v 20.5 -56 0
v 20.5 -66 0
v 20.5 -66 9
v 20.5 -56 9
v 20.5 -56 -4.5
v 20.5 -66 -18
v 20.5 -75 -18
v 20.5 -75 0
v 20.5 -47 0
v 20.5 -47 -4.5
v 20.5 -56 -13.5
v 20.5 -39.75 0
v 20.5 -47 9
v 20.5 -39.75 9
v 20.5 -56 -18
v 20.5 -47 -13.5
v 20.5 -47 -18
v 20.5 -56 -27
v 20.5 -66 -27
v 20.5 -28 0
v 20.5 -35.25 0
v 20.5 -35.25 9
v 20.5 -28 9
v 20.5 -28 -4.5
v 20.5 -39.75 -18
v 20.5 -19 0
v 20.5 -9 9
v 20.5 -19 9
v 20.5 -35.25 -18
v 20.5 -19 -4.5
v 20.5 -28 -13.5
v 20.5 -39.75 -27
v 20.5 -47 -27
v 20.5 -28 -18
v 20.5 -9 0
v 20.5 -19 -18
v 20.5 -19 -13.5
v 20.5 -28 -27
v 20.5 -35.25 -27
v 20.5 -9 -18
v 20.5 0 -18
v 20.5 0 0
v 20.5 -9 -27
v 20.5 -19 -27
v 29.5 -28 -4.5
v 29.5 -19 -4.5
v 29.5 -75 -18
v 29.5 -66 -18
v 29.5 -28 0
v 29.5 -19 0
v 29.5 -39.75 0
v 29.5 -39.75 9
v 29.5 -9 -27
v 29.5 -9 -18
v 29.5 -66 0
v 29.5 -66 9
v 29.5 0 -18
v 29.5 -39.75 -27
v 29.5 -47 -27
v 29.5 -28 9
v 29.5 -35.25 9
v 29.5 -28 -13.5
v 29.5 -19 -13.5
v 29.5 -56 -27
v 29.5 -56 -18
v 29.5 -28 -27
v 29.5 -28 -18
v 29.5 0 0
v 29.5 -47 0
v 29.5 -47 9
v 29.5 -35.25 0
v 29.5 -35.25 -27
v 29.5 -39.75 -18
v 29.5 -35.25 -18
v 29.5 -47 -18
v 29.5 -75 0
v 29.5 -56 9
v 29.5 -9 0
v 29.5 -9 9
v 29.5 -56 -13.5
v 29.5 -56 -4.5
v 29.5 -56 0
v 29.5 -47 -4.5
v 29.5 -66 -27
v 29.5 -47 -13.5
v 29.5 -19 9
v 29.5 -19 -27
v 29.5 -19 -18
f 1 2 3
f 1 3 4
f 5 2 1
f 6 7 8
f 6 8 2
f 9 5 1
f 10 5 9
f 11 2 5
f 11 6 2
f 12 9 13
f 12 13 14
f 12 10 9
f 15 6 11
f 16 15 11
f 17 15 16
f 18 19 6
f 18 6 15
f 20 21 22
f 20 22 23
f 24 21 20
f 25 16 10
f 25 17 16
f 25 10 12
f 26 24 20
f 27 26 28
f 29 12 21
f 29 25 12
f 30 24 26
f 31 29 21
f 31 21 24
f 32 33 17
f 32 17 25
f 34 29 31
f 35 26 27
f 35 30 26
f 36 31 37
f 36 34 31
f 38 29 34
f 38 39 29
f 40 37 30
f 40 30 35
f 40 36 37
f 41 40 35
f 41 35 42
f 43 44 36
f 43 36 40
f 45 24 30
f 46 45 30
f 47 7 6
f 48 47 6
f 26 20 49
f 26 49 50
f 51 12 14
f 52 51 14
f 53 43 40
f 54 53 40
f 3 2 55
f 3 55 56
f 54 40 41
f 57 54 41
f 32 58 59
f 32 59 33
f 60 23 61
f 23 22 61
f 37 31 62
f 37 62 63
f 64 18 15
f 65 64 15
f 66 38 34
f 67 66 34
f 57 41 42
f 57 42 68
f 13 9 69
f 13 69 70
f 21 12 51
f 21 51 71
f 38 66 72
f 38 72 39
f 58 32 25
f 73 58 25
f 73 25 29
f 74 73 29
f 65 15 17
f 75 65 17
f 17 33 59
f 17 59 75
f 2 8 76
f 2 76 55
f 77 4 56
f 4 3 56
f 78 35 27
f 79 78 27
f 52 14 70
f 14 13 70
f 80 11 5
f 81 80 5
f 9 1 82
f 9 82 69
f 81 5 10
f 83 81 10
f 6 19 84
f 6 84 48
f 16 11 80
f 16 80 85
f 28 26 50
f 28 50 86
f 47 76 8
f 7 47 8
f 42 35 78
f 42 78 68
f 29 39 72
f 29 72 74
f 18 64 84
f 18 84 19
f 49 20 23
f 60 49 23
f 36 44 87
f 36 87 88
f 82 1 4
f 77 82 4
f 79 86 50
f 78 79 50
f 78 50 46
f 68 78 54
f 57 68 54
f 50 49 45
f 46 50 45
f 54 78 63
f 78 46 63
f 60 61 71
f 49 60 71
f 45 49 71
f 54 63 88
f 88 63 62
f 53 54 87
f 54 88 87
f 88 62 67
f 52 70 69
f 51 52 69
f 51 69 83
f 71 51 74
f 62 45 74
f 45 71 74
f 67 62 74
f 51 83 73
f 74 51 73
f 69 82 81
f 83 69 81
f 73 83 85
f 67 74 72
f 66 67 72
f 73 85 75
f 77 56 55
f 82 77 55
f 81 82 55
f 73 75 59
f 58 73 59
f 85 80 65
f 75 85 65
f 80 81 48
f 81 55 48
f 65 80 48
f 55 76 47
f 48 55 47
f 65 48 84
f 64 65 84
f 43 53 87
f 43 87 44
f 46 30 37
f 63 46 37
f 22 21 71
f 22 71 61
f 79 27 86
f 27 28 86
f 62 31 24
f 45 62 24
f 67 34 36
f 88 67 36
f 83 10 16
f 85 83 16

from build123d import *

# Parameters (mm, degrees)
SKETCH1_R                = 8
SKETCH1_R_2              = 4
BOSS_EXTRUDE1_DEPTH      = 9
BOSS_EXTRUDE1_2_DEPTH    = 9
SKETCH2_R                = 4
BOSS_EXTRUDE3_DEPTH      = 9
FILLET1_R                = 1
CUT_EXTRUDE1_DEPTH       = 214.789616212
SKETCH4_W                = 9
SKETCH4_H                = 27
BOSS_EXTRUDE4_DEPTH      = 75
BOSS_EXTRUDE5_START      = 9
SKETCH5_R                = 25
SKETCH5_R_2              = 4
BOSS_EXTRUDE5_DEPTH      = 9
BOSS_EXTRUDE6_DEPTH      = 4.5
BOSS_EXTRUDE6_DEPTH_BACK = 4.5
BOSS_EXTRUDE7_DEPTH      = 4.5
BOSS_EXTRUDE7_DEPTH_BACK = 4.5
BOSS_EXTRUDE7_START      = -25
SKETCH9_W                = 9
SKETCH9_H                = 7
SKETCH9_H_2              = 9
CUT_EXTRUDE2_DEPTH       = 217.612557346
CUT_EXTRUDE3_DEPTH       = 216.299790989
CUT_EXTRUDE3_DEPTH_BACK  = 216.299790989
SKETCH10_W               = 383.266903908
SKETCH10_H               = 66.559710411
SKETCH10_W_2             = 9
SKETCH10_H_2             = 36
SKETCH12_W               = 9
SKETCH12_H               = 9
SKETCH12_W_2             = 4.5
SKETCH12_H_2             = 9.054007778
SKETCH12_H_3             = 4.5
SKETCH12_H_4             = 5
CUT_EXTRUDE4_DEPTH       = 81.218451743


with BuildPart() as part:
    # Sketch1 → Boss-Extrude1 (new body)
    with BuildSketch(Plane.XY):
        with Locations((-125, 0)):
            Circle(SKETCH1_R)
        with Locations((-125, 0)):
            Circle(SKETCH1_R_2, mode=Mode.SUBTRACT)
    extrude(amount=BOSS_EXTRUDE1_DEPTH)



with BuildPart() as body_2:
    # Sketch1 → Boss-Extrude1 2 (new body)
    with BuildSketch(Plane.XY):
        with Locations((125, 0)):
            Circle(SKETCH1_R)
        with Locations((125, 0)):
            Circle(SKETCH1_R_2, mode=Mode.SUBTRACT)
    extrude(amount=BOSS_EXTRUDE1_2_DEPTH)


with BuildPart() as part_1:
    add(part.part)

    add(body_2.part)  # Boss-Extrude3 merges body 2
    # Sketch2 → Boss-Extrude3 (add)
    with BuildSketch(Plane.XY):
        with BuildLine():
            Line((-175, -75), (125, -75))
            ThreePointArc((125, -75), (130.131670325, -43.377223009), (145.000000492, -14.999999344))
            ThreePointArc((145.000000492, -14.999999344), (143.981414944, 16.269784471), (113.235294528, 22.058823748))
            ThreePointArc((113.235294528, 22.058823748), (25.000000075, 0), (-63.235294395, 22.058823677))
            ThreePointArc((-63.235294395, 22.058823677), (-75.420498385, 24.996463372), (-87.499999896, 21.650635154))
            ThreePointArc((-87.499999896, 21.650635154), (-99.999999954, 18.301270189), (-112.500000024, 21.650635108))
            ThreePointArc((-112.500000024, 21.650635108), (-124.99999995, 25), (-137.49999989, 21.650635158))
            ThreePointArc((-137.49999989, 21.650635158), (-149.999999954, 18.301270189), (-162.50000003, 21.650635112))
            ThreePointArc((-162.50000003, 21.650635112), (-193.705072901, 16.586749162), (-195.000000551, -14.999999265))
            ThreePointArc((-195.000000551, -14.999999265), (-180.13167034, -43.377222962), (-175, -75))
        make_face()
        with Locations((125, 0)):
            Circle(SKETCH2_R, mode=Mode.SUBTRACT)
        with Locations((-175, 0)):
            Circle(SKETCH2_R, mode=Mode.SUBTRACT)
        with Locations((-125, 0)):
            Circle(SKETCH2_R, mode=Mode.SUBTRACT)
        with Locations((-75, 0)):
            Circle(SKETCH2_R, mode=Mode.SUBTRACT)
    extrude(amount=BOSS_EXTRUDE3_DEPTH)

    # Fillet1
    fillet1_edges = [part_1.edges().sort_by_distance(p)[0] for p in [
        (-175, -75, 4.5),
        (125, -75, 4.5),
    ]]
    fillet(fillet1_edges, radius=FILLET1_R)

    # Sketch3 → Cut-Extrude1 (cut, through all)
    with BuildSketch(Plane.XY):
        Polygon((25, 0), (25, -75), (150, -75), (150, 25), (25, 25), align=None)
    extrude(amount=CUT_EXTRUDE1_DEPTH, mode=Mode.SUBTRACT)

    # Sketch4 → Boss-Extrude4 (add)
    with BuildSketch(Plane.XZ.offset(75)):
        with Locations((25, -4.5)):
            Rectangle(SKETCH4_W, SKETCH4_H)
    extrude(amount=-BOSS_EXTRUDE4_DEPTH)

    # Sketch5 → Boss-Extrude5 (add)
    # profile 1 of 4: a face of its own
    with BuildSketch(Plane(origin=(0, 0, -18), x_dir=(-1, 0, 0), z_dir=(0, 0, -1)).offset(BOSS_EXTRUDE5_START)):
        with BuildLine():
            ThreePointArc((-145.000000304, -14.999999594), (-130.131670275, -43.377223158), (-125, -75))
            Line((-125, -75), (-29.5, -75))
            Line((-29.5, -75), (-29.5, 0))
            Line((-29.5, 0), (-100, 0))
            ThreePointArc((-100, 0), (-117.09430609, -23.717082532), (-145.000000304, -14.999999594))
        make_face()
    # profile 2 of 4: a face of its own
    with BuildSketch(Plane(origin=(0, 0, -18), x_dir=(-1, 0, 0), z_dir=(0, 0, -1)).offset(BOSS_EXTRUDE5_START)):
        with Locations((-125, 0)):
            Circle(SKETCH5_R)
        with Locations((-125, 0)):
            Circle(SKETCH5_R_2, mode=Mode.SUBTRACT)
    # profile 3 of 4: a face of its own
    with BuildSketch(Plane(origin=(0, 0, -18), x_dir=(-1, 0, 0), z_dir=(0, 0, -1)).offset(BOSS_EXTRUDE5_START)):
        Polygon((-29.5, 0), (-29.5, -75), (-20.5, -75), (-20.5, 0), (-25, 0), align=None)
    # profile 4 of 4: a face of its own
    with BuildSketch(Plane(origin=(0, 0, -18), x_dir=(-1, 0, 0), z_dir=(0, 0, -1)).offset(BOSS_EXTRUDE5_START)):
        with BuildLine():
            Line((-100, 0), (-29.5, 0))
            Line((-29.5, 0), (-25, 0))
            ThreePointArc((-25, 0), (-70.475429529, 5.598281181), (-113.235293817, 22.058823369))
            ThreePointArc((-113.235293817, 22.058823369), (-103.56267677, 12.86239374), (-100, 0))
        make_face()
    extrude(amount=-BOSS_EXTRUDE5_DEPTH)

    # Sketch7 → Boss-Extrude6 (add, two sides: drawn at the far end of the back side and taken through both)
    with BuildSketch(Plane(origin=(0, -25, 0), x_dir=(1, 0, 0), z_dir=(0, 1, 0)).offset(-BOSS_EXTRUDE6_DEPTH_BACK)):
        with BuildLine():
            Line((56.5, 18), (29.5, 18))
            Line((29.5, 18), (29.5, -9))
            ThreePointArc((29.5, -9), (48.591883092, -1.091883092), (56.5, 18))
        make_face()
        with BuildLine():
            Line((-6.5, 0), (20.5, 0))
            Line((20.5, 0), (20.5, 27))
            ThreePointArc((20.5, 27), (1.408116908, 19.091883092), (-6.5, 0))
        make_face()
    extrude(amount=BOSS_EXTRUDE6_DEPTH + BOSS_EXTRUDE6_DEPTH_BACK)

    # Sketch7<3> → Boss-Extrude7 (add, two sides: drawn at the far end of the back side and taken through both)
    with BuildSketch(Plane(origin=(0, -25, 0), x_dir=(1, 0, 0), z_dir=(0, 1, 0)).offset(BOSS_EXTRUDE7_START - BOSS_EXTRUDE7_DEPTH_BACK)):
        with BuildLine():
            Line((56.5, 18), (29.5, 18))
            Line((29.5, 18), (29.5, -9))
            ThreePointArc((29.5, -9), (48.591883092, -1.091883092), (56.5, 18))
        make_face()
        with BuildLine():
            Line((-6.5, 0), (20.5, 0))
            Line((20.5, 0), (20.5, 27))
            ThreePointArc((20.5, 27), (1.408116908, 19.091883092), (-6.5, 0))
        make_face()
    extrude(amount=BOSS_EXTRUDE7_DEPTH + BOSS_EXTRUDE7_DEPTH_BACK)

    # Sketch9 → Cut-Extrude2 (cut, through all)
    with BuildSketch(Plane.XY.offset(9)):
        with Locations((-160.208548161, -53.5)):
            Rectangle(SKETCH9_W, SKETCH9_H)
        with Locations((-160.208548161, -70.5)):
            Rectangle(SKETCH9_W, SKETCH9_H_2)
        with Locations((-25.351798772, -53.5)):
            Rectangle(SKETCH9_W, SKETCH9_H)
        with Locations((-25.351798772, -70.5)):
            Rectangle(SKETCH9_W, SKETCH9_H_2)
        with Locations((109.504950616, -53.5)):
            Rectangle(SKETCH9_W, SKETCH9_H)
        with Locations((109.504950616, -70.5)):
            Rectangle(SKETCH9_W, SKETCH9_H_2)
    extrude(amount=-CUT_EXTRUDE2_DEPTH, mode=Mode.SUBTRACT)

    # Sketch10 → Cut-Extrude3 (cut, two sides: drawn at the far end of the back side and taken through both)
    with BuildSketch(Plane(origin=(0, 0, 0), x_dir=(1, 0, 0), z_dir=(0, 1, 0)).offset(-CUT_EXTRUDE3_DEPTH_BACK)):
        with Locations((-25.802694846, 3.514309581)):
            Rectangle(SKETCH10_W, SKETCH10_H)
        with Locations((25, 9)):
            Rectangle(SKETCH10_W_2, SKETCH10_H_2, mode=Mode.SUBTRACT)
    extrude(amount=CUT_EXTRUDE3_DEPTH + CUT_EXTRUDE3_DEPTH_BACK, mode=Mode.SUBTRACT)

    # Sketch12 → Cut-Extrude4 (cut, through all)
    with BuildSketch(Plane.ZY.offset(-20.5)):
        with Locations((-22.5, -23.5)):
            Rectangle(SKETCH12_W, SKETCH12_H)
        with Locations((-22.5, -51.5)):
            Rectangle(SKETCH12_W, SKETCH12_H)
        with Locations((4.5, -51.5)):
            Rectangle(SKETCH12_W, SKETCH12_H)
        with Locations((4.5, -23.5)):
            Rectangle(SKETCH12_W, SKETCH12_H)
        with Locations((-6.75, -23.5)):
            Rectangle(SKETCH12_W_2, SKETCH12_H)
        with Locations((-11.25, -23.5)):
            Rectangle(SKETCH12_W_2, SKETCH12_H)
        with Locations((-11.25, -51.5)):
            Rectangle(SKETCH12_W_2, SKETCH12_H)
        with Locations((-6.75, -51.5)):
            Rectangle(SKETCH12_W_2, SKETCH12_H)
        with Locations((-22.5, -4.5)):
            Rectangle(SKETCH12_W, SKETCH12_H)
        with Locations((4.5, -4.472996111)):
            Rectangle(SKETCH12_W, SKETCH12_H_2)
        with Locations((4.5, -70.5)):
            Rectangle(SKETCH12_W, SKETCH12_H)
        with Locations((-22.5, -70.5)):
            Rectangle(SKETCH12_W, SKETCH12_H)
        with Locations((-22.5, -37.5)):
            Rectangle(SKETCH12_W, SKETCH12_H_3)
        with Locations((4.5, -37.5)):
            Rectangle(SKETCH12_W, SKETCH12_H_3)
        with Locations((-22.5, 2.5)):
            Rectangle(SKETCH12_W, SKETCH12_H_4)
    extrude(amount=-CUT_EXTRUDE4_DEPTH, mode=Mode.SUBTRACT)


solid = part_1.part
